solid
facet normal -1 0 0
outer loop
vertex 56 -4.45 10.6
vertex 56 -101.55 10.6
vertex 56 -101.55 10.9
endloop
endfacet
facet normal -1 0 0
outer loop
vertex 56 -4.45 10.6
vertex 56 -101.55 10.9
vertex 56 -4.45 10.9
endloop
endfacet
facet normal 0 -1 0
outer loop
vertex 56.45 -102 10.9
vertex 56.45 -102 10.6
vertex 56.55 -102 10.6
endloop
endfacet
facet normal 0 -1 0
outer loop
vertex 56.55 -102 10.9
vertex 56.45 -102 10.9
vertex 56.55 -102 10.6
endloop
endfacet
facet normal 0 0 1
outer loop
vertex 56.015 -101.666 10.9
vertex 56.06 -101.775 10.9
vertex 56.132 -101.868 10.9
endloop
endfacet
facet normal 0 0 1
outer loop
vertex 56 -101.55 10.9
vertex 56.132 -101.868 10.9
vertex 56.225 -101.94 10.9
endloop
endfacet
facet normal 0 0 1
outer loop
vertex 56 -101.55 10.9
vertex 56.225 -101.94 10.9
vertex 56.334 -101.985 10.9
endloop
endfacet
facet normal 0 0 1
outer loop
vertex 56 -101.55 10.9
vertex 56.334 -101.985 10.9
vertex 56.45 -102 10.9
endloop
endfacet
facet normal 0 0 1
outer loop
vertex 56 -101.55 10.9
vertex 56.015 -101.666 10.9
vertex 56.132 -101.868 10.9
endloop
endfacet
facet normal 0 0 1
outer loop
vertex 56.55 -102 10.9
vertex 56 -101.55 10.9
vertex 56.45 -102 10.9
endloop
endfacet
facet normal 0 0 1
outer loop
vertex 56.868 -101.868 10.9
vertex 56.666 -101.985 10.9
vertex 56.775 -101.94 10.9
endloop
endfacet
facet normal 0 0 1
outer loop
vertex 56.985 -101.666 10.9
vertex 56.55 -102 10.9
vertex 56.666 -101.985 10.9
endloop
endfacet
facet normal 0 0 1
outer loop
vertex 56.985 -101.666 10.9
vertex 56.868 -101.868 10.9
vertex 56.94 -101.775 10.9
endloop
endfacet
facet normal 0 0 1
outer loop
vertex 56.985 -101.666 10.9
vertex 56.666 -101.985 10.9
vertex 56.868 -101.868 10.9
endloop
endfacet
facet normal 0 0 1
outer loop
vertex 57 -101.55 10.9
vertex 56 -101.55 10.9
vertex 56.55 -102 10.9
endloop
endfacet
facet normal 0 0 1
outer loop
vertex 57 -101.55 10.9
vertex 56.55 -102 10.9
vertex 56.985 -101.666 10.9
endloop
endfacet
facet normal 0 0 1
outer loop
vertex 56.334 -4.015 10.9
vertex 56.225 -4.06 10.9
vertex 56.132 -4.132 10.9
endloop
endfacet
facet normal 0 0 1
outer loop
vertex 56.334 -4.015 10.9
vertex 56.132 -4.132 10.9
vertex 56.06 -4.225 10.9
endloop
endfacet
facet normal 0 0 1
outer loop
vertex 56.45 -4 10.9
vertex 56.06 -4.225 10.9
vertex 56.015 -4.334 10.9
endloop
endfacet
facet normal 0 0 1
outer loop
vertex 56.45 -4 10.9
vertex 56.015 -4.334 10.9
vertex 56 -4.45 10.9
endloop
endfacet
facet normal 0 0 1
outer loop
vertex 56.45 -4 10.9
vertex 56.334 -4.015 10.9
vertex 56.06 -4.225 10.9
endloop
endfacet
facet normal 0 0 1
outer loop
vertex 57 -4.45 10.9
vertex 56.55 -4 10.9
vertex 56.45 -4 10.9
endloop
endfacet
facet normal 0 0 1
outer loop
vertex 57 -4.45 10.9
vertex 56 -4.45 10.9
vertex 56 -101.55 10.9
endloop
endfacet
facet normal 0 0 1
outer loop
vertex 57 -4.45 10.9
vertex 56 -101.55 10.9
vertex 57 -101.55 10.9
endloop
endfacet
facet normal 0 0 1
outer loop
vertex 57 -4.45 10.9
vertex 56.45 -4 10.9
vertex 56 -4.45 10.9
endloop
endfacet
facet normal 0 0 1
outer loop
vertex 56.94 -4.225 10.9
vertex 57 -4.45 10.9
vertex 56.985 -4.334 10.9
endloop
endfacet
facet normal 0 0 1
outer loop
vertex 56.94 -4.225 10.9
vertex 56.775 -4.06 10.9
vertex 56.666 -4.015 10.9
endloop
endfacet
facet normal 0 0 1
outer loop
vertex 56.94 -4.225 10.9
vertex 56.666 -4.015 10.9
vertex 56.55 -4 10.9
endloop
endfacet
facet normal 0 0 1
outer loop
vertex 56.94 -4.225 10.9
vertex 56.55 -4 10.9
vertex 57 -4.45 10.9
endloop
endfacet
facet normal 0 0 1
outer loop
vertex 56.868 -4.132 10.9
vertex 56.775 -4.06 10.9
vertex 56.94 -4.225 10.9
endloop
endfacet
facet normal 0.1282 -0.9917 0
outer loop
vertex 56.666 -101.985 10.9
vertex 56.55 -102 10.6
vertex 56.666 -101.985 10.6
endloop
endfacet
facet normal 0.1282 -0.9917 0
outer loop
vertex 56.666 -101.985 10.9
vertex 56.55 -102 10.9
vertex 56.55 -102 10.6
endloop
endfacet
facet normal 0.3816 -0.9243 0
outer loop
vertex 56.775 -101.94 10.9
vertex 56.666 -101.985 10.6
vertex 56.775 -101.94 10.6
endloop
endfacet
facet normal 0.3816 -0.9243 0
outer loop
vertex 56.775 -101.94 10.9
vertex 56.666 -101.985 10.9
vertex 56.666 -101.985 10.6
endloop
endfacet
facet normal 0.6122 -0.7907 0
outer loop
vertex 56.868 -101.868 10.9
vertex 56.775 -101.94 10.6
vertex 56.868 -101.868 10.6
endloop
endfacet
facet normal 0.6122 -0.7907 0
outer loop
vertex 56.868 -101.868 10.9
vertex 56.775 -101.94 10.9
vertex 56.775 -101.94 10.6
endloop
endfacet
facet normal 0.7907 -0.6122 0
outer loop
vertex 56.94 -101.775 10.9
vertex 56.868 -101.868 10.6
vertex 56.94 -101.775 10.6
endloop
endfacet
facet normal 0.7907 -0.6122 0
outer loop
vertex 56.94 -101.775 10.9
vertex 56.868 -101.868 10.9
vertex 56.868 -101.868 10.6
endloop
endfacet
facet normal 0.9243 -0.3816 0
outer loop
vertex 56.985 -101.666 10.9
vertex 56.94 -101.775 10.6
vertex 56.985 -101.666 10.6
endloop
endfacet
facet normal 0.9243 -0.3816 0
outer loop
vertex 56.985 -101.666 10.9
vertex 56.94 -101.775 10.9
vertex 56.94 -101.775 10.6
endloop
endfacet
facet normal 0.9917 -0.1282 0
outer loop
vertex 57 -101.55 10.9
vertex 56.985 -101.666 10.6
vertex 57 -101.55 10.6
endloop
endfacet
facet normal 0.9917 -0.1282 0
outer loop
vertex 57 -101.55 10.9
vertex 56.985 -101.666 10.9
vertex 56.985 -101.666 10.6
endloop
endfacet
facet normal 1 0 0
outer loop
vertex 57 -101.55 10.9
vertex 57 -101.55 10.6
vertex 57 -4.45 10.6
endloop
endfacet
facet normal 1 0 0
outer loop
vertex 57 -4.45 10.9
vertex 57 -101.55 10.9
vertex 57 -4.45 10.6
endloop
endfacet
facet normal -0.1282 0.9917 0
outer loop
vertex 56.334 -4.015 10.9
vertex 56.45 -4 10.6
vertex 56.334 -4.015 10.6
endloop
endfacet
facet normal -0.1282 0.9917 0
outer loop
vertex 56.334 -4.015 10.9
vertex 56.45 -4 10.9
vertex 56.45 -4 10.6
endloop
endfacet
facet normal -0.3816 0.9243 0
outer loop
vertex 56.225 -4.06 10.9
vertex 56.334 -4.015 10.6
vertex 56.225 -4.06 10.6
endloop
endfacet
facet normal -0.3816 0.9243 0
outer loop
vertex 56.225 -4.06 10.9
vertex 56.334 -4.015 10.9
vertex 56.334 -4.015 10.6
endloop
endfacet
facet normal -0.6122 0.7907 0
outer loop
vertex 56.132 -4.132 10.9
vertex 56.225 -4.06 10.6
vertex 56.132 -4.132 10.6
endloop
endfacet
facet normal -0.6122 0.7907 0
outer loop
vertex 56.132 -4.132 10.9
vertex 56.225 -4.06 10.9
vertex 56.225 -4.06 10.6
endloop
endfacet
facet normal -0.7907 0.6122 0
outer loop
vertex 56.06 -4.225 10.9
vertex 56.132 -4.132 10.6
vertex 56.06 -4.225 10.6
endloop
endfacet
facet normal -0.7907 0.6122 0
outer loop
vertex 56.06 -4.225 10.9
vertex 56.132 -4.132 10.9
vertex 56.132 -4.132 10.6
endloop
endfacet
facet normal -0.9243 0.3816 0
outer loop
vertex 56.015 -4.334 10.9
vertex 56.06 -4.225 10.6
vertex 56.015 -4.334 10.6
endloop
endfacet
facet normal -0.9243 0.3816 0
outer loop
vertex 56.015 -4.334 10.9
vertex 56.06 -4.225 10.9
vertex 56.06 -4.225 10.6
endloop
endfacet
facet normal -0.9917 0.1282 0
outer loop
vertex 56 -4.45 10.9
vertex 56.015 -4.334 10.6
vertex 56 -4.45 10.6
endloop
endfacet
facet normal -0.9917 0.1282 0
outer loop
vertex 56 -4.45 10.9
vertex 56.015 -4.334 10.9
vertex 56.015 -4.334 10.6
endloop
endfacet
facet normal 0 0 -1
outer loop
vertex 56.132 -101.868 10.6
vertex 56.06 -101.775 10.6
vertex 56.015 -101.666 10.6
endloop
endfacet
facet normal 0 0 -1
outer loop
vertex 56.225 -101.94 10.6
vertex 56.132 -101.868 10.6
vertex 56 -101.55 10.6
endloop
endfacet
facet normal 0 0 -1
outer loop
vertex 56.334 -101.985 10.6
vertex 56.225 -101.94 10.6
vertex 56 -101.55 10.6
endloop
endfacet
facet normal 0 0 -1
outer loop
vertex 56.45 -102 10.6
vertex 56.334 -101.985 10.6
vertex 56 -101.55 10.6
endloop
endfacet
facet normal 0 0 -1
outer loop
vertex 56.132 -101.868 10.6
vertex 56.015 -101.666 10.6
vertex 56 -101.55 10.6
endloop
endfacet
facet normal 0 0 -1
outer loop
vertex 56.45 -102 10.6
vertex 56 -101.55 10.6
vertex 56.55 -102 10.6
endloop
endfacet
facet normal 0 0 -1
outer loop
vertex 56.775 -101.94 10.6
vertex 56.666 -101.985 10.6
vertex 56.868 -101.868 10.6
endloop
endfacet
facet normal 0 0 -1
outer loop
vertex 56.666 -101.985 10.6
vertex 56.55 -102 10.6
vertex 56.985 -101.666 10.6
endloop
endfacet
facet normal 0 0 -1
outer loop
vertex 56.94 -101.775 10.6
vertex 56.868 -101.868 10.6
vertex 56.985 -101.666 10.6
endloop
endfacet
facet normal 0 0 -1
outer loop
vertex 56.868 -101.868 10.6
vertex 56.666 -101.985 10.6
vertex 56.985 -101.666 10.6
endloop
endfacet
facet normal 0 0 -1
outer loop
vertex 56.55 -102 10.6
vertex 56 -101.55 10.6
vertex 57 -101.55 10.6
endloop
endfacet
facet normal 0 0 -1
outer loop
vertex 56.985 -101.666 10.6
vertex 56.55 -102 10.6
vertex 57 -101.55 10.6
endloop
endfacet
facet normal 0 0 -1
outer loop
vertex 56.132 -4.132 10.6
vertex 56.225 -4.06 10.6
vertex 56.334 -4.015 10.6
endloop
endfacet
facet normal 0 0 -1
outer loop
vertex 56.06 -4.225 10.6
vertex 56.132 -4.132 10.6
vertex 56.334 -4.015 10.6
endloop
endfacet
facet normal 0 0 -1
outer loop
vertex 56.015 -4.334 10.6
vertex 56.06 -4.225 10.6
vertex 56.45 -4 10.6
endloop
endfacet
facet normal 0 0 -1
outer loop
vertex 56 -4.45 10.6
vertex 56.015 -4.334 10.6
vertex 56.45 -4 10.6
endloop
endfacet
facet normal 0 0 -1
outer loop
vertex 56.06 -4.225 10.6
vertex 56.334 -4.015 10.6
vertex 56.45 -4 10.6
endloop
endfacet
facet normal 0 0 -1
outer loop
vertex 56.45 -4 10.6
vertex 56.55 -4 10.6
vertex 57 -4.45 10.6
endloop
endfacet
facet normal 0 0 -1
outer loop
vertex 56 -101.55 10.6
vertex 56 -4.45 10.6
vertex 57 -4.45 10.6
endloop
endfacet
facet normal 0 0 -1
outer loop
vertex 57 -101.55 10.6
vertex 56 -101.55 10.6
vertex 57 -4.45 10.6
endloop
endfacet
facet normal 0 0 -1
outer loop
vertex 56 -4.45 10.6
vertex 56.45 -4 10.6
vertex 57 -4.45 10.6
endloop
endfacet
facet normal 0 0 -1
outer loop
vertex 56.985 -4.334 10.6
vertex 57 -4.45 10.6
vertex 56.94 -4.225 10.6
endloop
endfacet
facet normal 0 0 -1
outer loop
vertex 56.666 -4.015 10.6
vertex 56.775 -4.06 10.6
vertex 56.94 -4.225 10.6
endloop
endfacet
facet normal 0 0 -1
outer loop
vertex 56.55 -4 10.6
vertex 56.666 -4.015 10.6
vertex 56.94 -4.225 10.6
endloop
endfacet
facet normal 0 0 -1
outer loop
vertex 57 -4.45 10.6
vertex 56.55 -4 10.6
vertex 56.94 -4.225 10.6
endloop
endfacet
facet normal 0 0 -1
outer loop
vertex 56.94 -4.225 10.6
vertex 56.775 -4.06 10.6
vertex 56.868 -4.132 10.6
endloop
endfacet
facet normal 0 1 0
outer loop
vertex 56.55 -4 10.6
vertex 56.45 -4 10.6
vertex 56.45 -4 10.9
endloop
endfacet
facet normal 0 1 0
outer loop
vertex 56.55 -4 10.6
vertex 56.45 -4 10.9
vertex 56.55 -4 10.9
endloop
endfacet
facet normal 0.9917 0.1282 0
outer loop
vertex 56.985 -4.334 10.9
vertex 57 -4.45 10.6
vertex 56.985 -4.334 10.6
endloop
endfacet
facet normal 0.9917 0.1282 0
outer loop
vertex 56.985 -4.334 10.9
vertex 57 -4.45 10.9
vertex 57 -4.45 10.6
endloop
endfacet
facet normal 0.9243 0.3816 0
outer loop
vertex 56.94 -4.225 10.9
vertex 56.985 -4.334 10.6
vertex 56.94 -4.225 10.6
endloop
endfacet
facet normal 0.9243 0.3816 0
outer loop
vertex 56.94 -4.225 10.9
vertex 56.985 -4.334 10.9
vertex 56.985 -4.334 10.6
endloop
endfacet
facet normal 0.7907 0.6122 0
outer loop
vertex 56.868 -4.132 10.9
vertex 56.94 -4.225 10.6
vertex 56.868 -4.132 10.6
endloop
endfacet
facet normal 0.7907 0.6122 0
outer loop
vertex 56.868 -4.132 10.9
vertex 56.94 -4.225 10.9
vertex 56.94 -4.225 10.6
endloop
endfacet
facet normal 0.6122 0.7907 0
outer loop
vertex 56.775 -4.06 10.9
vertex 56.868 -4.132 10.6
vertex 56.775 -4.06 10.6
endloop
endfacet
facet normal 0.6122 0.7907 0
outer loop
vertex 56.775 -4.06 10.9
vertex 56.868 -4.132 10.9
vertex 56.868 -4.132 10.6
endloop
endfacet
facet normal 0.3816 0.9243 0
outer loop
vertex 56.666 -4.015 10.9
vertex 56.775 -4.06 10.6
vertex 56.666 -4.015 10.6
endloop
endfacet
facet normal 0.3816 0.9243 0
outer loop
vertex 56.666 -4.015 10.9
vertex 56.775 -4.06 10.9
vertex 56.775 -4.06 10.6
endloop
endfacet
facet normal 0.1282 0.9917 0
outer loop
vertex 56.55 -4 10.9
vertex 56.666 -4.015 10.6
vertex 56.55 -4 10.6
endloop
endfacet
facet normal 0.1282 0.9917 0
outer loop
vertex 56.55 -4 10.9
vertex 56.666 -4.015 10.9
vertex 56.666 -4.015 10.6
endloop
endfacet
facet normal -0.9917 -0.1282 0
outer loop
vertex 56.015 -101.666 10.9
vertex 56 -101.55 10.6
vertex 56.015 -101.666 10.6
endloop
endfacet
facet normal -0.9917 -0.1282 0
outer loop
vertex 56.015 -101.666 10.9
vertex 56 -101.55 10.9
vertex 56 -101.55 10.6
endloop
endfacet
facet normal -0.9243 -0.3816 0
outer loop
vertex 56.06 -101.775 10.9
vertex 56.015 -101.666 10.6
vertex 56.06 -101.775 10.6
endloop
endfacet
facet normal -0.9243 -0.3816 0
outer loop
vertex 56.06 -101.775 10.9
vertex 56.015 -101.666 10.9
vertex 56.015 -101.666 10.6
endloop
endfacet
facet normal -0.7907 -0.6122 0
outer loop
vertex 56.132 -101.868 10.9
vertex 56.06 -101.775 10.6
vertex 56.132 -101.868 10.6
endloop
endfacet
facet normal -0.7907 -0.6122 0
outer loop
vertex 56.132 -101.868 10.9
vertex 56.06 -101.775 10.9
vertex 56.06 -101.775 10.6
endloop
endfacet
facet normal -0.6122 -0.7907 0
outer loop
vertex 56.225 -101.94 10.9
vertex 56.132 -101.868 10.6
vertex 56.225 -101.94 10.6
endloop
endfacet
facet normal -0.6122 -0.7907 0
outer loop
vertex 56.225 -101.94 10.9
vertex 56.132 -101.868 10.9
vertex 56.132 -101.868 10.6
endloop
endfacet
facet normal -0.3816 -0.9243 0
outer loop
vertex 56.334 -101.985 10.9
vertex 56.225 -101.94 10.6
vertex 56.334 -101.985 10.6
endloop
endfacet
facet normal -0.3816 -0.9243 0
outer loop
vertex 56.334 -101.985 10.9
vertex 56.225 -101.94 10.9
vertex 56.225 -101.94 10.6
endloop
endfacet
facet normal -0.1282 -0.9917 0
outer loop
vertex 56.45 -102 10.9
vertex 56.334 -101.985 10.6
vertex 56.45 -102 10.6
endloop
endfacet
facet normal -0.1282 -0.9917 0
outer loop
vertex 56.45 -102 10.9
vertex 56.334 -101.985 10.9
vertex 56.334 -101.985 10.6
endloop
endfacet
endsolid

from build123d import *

# Parameters (mm, degrees)
BOX006_W     = 1
BOX006_H     = 98
BOX006_DEPTH = 0.3
FILLET007_R  = 0.45
FILLET008_R  = 0.45
FILLET009_R  = 0.45
FILLET010_R  = 0.45


with BuildPart() as part:
    # Box006 → Box006 (new body)
    with BuildSketch(Plane(origin=(56, -102, 10.6), x_dir=(1, 0, 0), z_dir=(0, 0, 1))):
        with Locations((0.5, 49)):
            Rectangle(BOX006_W, BOX006_H)
    extrude(amount=BOX006_DEPTH)

    # Fillet007
    fillet007_edges = [part.edges().sort_by_distance(p)[0] for p in [
        (56, -102, 10.75),
    ]]
    fillet(fillet007_edges, radius=FILLET007_R)

    # Fillet008
    fillet008_edges = [part.edges().sort_by_distance(p)[0] for p in [
        (57, -102, 10.75),
    ]]
    fillet(fillet008_edges, radius=FILLET008_R)

    # Fillet009
    fillet009_edges = [part.edges().sort_by_distance(p)[0] for p in [
        (57, -4, 10.75),
    ]]
    fillet(fillet009_edges, radius=FILLET009_R)

    # Fillet010
    fillet010_edges = [part.edges().sort_by_distance(p)[0] for p in [
        (56, -4, 10.75),
    ]]
    fillet(fillet010_edges, radius=FILLET010_R)


solid = part.part
